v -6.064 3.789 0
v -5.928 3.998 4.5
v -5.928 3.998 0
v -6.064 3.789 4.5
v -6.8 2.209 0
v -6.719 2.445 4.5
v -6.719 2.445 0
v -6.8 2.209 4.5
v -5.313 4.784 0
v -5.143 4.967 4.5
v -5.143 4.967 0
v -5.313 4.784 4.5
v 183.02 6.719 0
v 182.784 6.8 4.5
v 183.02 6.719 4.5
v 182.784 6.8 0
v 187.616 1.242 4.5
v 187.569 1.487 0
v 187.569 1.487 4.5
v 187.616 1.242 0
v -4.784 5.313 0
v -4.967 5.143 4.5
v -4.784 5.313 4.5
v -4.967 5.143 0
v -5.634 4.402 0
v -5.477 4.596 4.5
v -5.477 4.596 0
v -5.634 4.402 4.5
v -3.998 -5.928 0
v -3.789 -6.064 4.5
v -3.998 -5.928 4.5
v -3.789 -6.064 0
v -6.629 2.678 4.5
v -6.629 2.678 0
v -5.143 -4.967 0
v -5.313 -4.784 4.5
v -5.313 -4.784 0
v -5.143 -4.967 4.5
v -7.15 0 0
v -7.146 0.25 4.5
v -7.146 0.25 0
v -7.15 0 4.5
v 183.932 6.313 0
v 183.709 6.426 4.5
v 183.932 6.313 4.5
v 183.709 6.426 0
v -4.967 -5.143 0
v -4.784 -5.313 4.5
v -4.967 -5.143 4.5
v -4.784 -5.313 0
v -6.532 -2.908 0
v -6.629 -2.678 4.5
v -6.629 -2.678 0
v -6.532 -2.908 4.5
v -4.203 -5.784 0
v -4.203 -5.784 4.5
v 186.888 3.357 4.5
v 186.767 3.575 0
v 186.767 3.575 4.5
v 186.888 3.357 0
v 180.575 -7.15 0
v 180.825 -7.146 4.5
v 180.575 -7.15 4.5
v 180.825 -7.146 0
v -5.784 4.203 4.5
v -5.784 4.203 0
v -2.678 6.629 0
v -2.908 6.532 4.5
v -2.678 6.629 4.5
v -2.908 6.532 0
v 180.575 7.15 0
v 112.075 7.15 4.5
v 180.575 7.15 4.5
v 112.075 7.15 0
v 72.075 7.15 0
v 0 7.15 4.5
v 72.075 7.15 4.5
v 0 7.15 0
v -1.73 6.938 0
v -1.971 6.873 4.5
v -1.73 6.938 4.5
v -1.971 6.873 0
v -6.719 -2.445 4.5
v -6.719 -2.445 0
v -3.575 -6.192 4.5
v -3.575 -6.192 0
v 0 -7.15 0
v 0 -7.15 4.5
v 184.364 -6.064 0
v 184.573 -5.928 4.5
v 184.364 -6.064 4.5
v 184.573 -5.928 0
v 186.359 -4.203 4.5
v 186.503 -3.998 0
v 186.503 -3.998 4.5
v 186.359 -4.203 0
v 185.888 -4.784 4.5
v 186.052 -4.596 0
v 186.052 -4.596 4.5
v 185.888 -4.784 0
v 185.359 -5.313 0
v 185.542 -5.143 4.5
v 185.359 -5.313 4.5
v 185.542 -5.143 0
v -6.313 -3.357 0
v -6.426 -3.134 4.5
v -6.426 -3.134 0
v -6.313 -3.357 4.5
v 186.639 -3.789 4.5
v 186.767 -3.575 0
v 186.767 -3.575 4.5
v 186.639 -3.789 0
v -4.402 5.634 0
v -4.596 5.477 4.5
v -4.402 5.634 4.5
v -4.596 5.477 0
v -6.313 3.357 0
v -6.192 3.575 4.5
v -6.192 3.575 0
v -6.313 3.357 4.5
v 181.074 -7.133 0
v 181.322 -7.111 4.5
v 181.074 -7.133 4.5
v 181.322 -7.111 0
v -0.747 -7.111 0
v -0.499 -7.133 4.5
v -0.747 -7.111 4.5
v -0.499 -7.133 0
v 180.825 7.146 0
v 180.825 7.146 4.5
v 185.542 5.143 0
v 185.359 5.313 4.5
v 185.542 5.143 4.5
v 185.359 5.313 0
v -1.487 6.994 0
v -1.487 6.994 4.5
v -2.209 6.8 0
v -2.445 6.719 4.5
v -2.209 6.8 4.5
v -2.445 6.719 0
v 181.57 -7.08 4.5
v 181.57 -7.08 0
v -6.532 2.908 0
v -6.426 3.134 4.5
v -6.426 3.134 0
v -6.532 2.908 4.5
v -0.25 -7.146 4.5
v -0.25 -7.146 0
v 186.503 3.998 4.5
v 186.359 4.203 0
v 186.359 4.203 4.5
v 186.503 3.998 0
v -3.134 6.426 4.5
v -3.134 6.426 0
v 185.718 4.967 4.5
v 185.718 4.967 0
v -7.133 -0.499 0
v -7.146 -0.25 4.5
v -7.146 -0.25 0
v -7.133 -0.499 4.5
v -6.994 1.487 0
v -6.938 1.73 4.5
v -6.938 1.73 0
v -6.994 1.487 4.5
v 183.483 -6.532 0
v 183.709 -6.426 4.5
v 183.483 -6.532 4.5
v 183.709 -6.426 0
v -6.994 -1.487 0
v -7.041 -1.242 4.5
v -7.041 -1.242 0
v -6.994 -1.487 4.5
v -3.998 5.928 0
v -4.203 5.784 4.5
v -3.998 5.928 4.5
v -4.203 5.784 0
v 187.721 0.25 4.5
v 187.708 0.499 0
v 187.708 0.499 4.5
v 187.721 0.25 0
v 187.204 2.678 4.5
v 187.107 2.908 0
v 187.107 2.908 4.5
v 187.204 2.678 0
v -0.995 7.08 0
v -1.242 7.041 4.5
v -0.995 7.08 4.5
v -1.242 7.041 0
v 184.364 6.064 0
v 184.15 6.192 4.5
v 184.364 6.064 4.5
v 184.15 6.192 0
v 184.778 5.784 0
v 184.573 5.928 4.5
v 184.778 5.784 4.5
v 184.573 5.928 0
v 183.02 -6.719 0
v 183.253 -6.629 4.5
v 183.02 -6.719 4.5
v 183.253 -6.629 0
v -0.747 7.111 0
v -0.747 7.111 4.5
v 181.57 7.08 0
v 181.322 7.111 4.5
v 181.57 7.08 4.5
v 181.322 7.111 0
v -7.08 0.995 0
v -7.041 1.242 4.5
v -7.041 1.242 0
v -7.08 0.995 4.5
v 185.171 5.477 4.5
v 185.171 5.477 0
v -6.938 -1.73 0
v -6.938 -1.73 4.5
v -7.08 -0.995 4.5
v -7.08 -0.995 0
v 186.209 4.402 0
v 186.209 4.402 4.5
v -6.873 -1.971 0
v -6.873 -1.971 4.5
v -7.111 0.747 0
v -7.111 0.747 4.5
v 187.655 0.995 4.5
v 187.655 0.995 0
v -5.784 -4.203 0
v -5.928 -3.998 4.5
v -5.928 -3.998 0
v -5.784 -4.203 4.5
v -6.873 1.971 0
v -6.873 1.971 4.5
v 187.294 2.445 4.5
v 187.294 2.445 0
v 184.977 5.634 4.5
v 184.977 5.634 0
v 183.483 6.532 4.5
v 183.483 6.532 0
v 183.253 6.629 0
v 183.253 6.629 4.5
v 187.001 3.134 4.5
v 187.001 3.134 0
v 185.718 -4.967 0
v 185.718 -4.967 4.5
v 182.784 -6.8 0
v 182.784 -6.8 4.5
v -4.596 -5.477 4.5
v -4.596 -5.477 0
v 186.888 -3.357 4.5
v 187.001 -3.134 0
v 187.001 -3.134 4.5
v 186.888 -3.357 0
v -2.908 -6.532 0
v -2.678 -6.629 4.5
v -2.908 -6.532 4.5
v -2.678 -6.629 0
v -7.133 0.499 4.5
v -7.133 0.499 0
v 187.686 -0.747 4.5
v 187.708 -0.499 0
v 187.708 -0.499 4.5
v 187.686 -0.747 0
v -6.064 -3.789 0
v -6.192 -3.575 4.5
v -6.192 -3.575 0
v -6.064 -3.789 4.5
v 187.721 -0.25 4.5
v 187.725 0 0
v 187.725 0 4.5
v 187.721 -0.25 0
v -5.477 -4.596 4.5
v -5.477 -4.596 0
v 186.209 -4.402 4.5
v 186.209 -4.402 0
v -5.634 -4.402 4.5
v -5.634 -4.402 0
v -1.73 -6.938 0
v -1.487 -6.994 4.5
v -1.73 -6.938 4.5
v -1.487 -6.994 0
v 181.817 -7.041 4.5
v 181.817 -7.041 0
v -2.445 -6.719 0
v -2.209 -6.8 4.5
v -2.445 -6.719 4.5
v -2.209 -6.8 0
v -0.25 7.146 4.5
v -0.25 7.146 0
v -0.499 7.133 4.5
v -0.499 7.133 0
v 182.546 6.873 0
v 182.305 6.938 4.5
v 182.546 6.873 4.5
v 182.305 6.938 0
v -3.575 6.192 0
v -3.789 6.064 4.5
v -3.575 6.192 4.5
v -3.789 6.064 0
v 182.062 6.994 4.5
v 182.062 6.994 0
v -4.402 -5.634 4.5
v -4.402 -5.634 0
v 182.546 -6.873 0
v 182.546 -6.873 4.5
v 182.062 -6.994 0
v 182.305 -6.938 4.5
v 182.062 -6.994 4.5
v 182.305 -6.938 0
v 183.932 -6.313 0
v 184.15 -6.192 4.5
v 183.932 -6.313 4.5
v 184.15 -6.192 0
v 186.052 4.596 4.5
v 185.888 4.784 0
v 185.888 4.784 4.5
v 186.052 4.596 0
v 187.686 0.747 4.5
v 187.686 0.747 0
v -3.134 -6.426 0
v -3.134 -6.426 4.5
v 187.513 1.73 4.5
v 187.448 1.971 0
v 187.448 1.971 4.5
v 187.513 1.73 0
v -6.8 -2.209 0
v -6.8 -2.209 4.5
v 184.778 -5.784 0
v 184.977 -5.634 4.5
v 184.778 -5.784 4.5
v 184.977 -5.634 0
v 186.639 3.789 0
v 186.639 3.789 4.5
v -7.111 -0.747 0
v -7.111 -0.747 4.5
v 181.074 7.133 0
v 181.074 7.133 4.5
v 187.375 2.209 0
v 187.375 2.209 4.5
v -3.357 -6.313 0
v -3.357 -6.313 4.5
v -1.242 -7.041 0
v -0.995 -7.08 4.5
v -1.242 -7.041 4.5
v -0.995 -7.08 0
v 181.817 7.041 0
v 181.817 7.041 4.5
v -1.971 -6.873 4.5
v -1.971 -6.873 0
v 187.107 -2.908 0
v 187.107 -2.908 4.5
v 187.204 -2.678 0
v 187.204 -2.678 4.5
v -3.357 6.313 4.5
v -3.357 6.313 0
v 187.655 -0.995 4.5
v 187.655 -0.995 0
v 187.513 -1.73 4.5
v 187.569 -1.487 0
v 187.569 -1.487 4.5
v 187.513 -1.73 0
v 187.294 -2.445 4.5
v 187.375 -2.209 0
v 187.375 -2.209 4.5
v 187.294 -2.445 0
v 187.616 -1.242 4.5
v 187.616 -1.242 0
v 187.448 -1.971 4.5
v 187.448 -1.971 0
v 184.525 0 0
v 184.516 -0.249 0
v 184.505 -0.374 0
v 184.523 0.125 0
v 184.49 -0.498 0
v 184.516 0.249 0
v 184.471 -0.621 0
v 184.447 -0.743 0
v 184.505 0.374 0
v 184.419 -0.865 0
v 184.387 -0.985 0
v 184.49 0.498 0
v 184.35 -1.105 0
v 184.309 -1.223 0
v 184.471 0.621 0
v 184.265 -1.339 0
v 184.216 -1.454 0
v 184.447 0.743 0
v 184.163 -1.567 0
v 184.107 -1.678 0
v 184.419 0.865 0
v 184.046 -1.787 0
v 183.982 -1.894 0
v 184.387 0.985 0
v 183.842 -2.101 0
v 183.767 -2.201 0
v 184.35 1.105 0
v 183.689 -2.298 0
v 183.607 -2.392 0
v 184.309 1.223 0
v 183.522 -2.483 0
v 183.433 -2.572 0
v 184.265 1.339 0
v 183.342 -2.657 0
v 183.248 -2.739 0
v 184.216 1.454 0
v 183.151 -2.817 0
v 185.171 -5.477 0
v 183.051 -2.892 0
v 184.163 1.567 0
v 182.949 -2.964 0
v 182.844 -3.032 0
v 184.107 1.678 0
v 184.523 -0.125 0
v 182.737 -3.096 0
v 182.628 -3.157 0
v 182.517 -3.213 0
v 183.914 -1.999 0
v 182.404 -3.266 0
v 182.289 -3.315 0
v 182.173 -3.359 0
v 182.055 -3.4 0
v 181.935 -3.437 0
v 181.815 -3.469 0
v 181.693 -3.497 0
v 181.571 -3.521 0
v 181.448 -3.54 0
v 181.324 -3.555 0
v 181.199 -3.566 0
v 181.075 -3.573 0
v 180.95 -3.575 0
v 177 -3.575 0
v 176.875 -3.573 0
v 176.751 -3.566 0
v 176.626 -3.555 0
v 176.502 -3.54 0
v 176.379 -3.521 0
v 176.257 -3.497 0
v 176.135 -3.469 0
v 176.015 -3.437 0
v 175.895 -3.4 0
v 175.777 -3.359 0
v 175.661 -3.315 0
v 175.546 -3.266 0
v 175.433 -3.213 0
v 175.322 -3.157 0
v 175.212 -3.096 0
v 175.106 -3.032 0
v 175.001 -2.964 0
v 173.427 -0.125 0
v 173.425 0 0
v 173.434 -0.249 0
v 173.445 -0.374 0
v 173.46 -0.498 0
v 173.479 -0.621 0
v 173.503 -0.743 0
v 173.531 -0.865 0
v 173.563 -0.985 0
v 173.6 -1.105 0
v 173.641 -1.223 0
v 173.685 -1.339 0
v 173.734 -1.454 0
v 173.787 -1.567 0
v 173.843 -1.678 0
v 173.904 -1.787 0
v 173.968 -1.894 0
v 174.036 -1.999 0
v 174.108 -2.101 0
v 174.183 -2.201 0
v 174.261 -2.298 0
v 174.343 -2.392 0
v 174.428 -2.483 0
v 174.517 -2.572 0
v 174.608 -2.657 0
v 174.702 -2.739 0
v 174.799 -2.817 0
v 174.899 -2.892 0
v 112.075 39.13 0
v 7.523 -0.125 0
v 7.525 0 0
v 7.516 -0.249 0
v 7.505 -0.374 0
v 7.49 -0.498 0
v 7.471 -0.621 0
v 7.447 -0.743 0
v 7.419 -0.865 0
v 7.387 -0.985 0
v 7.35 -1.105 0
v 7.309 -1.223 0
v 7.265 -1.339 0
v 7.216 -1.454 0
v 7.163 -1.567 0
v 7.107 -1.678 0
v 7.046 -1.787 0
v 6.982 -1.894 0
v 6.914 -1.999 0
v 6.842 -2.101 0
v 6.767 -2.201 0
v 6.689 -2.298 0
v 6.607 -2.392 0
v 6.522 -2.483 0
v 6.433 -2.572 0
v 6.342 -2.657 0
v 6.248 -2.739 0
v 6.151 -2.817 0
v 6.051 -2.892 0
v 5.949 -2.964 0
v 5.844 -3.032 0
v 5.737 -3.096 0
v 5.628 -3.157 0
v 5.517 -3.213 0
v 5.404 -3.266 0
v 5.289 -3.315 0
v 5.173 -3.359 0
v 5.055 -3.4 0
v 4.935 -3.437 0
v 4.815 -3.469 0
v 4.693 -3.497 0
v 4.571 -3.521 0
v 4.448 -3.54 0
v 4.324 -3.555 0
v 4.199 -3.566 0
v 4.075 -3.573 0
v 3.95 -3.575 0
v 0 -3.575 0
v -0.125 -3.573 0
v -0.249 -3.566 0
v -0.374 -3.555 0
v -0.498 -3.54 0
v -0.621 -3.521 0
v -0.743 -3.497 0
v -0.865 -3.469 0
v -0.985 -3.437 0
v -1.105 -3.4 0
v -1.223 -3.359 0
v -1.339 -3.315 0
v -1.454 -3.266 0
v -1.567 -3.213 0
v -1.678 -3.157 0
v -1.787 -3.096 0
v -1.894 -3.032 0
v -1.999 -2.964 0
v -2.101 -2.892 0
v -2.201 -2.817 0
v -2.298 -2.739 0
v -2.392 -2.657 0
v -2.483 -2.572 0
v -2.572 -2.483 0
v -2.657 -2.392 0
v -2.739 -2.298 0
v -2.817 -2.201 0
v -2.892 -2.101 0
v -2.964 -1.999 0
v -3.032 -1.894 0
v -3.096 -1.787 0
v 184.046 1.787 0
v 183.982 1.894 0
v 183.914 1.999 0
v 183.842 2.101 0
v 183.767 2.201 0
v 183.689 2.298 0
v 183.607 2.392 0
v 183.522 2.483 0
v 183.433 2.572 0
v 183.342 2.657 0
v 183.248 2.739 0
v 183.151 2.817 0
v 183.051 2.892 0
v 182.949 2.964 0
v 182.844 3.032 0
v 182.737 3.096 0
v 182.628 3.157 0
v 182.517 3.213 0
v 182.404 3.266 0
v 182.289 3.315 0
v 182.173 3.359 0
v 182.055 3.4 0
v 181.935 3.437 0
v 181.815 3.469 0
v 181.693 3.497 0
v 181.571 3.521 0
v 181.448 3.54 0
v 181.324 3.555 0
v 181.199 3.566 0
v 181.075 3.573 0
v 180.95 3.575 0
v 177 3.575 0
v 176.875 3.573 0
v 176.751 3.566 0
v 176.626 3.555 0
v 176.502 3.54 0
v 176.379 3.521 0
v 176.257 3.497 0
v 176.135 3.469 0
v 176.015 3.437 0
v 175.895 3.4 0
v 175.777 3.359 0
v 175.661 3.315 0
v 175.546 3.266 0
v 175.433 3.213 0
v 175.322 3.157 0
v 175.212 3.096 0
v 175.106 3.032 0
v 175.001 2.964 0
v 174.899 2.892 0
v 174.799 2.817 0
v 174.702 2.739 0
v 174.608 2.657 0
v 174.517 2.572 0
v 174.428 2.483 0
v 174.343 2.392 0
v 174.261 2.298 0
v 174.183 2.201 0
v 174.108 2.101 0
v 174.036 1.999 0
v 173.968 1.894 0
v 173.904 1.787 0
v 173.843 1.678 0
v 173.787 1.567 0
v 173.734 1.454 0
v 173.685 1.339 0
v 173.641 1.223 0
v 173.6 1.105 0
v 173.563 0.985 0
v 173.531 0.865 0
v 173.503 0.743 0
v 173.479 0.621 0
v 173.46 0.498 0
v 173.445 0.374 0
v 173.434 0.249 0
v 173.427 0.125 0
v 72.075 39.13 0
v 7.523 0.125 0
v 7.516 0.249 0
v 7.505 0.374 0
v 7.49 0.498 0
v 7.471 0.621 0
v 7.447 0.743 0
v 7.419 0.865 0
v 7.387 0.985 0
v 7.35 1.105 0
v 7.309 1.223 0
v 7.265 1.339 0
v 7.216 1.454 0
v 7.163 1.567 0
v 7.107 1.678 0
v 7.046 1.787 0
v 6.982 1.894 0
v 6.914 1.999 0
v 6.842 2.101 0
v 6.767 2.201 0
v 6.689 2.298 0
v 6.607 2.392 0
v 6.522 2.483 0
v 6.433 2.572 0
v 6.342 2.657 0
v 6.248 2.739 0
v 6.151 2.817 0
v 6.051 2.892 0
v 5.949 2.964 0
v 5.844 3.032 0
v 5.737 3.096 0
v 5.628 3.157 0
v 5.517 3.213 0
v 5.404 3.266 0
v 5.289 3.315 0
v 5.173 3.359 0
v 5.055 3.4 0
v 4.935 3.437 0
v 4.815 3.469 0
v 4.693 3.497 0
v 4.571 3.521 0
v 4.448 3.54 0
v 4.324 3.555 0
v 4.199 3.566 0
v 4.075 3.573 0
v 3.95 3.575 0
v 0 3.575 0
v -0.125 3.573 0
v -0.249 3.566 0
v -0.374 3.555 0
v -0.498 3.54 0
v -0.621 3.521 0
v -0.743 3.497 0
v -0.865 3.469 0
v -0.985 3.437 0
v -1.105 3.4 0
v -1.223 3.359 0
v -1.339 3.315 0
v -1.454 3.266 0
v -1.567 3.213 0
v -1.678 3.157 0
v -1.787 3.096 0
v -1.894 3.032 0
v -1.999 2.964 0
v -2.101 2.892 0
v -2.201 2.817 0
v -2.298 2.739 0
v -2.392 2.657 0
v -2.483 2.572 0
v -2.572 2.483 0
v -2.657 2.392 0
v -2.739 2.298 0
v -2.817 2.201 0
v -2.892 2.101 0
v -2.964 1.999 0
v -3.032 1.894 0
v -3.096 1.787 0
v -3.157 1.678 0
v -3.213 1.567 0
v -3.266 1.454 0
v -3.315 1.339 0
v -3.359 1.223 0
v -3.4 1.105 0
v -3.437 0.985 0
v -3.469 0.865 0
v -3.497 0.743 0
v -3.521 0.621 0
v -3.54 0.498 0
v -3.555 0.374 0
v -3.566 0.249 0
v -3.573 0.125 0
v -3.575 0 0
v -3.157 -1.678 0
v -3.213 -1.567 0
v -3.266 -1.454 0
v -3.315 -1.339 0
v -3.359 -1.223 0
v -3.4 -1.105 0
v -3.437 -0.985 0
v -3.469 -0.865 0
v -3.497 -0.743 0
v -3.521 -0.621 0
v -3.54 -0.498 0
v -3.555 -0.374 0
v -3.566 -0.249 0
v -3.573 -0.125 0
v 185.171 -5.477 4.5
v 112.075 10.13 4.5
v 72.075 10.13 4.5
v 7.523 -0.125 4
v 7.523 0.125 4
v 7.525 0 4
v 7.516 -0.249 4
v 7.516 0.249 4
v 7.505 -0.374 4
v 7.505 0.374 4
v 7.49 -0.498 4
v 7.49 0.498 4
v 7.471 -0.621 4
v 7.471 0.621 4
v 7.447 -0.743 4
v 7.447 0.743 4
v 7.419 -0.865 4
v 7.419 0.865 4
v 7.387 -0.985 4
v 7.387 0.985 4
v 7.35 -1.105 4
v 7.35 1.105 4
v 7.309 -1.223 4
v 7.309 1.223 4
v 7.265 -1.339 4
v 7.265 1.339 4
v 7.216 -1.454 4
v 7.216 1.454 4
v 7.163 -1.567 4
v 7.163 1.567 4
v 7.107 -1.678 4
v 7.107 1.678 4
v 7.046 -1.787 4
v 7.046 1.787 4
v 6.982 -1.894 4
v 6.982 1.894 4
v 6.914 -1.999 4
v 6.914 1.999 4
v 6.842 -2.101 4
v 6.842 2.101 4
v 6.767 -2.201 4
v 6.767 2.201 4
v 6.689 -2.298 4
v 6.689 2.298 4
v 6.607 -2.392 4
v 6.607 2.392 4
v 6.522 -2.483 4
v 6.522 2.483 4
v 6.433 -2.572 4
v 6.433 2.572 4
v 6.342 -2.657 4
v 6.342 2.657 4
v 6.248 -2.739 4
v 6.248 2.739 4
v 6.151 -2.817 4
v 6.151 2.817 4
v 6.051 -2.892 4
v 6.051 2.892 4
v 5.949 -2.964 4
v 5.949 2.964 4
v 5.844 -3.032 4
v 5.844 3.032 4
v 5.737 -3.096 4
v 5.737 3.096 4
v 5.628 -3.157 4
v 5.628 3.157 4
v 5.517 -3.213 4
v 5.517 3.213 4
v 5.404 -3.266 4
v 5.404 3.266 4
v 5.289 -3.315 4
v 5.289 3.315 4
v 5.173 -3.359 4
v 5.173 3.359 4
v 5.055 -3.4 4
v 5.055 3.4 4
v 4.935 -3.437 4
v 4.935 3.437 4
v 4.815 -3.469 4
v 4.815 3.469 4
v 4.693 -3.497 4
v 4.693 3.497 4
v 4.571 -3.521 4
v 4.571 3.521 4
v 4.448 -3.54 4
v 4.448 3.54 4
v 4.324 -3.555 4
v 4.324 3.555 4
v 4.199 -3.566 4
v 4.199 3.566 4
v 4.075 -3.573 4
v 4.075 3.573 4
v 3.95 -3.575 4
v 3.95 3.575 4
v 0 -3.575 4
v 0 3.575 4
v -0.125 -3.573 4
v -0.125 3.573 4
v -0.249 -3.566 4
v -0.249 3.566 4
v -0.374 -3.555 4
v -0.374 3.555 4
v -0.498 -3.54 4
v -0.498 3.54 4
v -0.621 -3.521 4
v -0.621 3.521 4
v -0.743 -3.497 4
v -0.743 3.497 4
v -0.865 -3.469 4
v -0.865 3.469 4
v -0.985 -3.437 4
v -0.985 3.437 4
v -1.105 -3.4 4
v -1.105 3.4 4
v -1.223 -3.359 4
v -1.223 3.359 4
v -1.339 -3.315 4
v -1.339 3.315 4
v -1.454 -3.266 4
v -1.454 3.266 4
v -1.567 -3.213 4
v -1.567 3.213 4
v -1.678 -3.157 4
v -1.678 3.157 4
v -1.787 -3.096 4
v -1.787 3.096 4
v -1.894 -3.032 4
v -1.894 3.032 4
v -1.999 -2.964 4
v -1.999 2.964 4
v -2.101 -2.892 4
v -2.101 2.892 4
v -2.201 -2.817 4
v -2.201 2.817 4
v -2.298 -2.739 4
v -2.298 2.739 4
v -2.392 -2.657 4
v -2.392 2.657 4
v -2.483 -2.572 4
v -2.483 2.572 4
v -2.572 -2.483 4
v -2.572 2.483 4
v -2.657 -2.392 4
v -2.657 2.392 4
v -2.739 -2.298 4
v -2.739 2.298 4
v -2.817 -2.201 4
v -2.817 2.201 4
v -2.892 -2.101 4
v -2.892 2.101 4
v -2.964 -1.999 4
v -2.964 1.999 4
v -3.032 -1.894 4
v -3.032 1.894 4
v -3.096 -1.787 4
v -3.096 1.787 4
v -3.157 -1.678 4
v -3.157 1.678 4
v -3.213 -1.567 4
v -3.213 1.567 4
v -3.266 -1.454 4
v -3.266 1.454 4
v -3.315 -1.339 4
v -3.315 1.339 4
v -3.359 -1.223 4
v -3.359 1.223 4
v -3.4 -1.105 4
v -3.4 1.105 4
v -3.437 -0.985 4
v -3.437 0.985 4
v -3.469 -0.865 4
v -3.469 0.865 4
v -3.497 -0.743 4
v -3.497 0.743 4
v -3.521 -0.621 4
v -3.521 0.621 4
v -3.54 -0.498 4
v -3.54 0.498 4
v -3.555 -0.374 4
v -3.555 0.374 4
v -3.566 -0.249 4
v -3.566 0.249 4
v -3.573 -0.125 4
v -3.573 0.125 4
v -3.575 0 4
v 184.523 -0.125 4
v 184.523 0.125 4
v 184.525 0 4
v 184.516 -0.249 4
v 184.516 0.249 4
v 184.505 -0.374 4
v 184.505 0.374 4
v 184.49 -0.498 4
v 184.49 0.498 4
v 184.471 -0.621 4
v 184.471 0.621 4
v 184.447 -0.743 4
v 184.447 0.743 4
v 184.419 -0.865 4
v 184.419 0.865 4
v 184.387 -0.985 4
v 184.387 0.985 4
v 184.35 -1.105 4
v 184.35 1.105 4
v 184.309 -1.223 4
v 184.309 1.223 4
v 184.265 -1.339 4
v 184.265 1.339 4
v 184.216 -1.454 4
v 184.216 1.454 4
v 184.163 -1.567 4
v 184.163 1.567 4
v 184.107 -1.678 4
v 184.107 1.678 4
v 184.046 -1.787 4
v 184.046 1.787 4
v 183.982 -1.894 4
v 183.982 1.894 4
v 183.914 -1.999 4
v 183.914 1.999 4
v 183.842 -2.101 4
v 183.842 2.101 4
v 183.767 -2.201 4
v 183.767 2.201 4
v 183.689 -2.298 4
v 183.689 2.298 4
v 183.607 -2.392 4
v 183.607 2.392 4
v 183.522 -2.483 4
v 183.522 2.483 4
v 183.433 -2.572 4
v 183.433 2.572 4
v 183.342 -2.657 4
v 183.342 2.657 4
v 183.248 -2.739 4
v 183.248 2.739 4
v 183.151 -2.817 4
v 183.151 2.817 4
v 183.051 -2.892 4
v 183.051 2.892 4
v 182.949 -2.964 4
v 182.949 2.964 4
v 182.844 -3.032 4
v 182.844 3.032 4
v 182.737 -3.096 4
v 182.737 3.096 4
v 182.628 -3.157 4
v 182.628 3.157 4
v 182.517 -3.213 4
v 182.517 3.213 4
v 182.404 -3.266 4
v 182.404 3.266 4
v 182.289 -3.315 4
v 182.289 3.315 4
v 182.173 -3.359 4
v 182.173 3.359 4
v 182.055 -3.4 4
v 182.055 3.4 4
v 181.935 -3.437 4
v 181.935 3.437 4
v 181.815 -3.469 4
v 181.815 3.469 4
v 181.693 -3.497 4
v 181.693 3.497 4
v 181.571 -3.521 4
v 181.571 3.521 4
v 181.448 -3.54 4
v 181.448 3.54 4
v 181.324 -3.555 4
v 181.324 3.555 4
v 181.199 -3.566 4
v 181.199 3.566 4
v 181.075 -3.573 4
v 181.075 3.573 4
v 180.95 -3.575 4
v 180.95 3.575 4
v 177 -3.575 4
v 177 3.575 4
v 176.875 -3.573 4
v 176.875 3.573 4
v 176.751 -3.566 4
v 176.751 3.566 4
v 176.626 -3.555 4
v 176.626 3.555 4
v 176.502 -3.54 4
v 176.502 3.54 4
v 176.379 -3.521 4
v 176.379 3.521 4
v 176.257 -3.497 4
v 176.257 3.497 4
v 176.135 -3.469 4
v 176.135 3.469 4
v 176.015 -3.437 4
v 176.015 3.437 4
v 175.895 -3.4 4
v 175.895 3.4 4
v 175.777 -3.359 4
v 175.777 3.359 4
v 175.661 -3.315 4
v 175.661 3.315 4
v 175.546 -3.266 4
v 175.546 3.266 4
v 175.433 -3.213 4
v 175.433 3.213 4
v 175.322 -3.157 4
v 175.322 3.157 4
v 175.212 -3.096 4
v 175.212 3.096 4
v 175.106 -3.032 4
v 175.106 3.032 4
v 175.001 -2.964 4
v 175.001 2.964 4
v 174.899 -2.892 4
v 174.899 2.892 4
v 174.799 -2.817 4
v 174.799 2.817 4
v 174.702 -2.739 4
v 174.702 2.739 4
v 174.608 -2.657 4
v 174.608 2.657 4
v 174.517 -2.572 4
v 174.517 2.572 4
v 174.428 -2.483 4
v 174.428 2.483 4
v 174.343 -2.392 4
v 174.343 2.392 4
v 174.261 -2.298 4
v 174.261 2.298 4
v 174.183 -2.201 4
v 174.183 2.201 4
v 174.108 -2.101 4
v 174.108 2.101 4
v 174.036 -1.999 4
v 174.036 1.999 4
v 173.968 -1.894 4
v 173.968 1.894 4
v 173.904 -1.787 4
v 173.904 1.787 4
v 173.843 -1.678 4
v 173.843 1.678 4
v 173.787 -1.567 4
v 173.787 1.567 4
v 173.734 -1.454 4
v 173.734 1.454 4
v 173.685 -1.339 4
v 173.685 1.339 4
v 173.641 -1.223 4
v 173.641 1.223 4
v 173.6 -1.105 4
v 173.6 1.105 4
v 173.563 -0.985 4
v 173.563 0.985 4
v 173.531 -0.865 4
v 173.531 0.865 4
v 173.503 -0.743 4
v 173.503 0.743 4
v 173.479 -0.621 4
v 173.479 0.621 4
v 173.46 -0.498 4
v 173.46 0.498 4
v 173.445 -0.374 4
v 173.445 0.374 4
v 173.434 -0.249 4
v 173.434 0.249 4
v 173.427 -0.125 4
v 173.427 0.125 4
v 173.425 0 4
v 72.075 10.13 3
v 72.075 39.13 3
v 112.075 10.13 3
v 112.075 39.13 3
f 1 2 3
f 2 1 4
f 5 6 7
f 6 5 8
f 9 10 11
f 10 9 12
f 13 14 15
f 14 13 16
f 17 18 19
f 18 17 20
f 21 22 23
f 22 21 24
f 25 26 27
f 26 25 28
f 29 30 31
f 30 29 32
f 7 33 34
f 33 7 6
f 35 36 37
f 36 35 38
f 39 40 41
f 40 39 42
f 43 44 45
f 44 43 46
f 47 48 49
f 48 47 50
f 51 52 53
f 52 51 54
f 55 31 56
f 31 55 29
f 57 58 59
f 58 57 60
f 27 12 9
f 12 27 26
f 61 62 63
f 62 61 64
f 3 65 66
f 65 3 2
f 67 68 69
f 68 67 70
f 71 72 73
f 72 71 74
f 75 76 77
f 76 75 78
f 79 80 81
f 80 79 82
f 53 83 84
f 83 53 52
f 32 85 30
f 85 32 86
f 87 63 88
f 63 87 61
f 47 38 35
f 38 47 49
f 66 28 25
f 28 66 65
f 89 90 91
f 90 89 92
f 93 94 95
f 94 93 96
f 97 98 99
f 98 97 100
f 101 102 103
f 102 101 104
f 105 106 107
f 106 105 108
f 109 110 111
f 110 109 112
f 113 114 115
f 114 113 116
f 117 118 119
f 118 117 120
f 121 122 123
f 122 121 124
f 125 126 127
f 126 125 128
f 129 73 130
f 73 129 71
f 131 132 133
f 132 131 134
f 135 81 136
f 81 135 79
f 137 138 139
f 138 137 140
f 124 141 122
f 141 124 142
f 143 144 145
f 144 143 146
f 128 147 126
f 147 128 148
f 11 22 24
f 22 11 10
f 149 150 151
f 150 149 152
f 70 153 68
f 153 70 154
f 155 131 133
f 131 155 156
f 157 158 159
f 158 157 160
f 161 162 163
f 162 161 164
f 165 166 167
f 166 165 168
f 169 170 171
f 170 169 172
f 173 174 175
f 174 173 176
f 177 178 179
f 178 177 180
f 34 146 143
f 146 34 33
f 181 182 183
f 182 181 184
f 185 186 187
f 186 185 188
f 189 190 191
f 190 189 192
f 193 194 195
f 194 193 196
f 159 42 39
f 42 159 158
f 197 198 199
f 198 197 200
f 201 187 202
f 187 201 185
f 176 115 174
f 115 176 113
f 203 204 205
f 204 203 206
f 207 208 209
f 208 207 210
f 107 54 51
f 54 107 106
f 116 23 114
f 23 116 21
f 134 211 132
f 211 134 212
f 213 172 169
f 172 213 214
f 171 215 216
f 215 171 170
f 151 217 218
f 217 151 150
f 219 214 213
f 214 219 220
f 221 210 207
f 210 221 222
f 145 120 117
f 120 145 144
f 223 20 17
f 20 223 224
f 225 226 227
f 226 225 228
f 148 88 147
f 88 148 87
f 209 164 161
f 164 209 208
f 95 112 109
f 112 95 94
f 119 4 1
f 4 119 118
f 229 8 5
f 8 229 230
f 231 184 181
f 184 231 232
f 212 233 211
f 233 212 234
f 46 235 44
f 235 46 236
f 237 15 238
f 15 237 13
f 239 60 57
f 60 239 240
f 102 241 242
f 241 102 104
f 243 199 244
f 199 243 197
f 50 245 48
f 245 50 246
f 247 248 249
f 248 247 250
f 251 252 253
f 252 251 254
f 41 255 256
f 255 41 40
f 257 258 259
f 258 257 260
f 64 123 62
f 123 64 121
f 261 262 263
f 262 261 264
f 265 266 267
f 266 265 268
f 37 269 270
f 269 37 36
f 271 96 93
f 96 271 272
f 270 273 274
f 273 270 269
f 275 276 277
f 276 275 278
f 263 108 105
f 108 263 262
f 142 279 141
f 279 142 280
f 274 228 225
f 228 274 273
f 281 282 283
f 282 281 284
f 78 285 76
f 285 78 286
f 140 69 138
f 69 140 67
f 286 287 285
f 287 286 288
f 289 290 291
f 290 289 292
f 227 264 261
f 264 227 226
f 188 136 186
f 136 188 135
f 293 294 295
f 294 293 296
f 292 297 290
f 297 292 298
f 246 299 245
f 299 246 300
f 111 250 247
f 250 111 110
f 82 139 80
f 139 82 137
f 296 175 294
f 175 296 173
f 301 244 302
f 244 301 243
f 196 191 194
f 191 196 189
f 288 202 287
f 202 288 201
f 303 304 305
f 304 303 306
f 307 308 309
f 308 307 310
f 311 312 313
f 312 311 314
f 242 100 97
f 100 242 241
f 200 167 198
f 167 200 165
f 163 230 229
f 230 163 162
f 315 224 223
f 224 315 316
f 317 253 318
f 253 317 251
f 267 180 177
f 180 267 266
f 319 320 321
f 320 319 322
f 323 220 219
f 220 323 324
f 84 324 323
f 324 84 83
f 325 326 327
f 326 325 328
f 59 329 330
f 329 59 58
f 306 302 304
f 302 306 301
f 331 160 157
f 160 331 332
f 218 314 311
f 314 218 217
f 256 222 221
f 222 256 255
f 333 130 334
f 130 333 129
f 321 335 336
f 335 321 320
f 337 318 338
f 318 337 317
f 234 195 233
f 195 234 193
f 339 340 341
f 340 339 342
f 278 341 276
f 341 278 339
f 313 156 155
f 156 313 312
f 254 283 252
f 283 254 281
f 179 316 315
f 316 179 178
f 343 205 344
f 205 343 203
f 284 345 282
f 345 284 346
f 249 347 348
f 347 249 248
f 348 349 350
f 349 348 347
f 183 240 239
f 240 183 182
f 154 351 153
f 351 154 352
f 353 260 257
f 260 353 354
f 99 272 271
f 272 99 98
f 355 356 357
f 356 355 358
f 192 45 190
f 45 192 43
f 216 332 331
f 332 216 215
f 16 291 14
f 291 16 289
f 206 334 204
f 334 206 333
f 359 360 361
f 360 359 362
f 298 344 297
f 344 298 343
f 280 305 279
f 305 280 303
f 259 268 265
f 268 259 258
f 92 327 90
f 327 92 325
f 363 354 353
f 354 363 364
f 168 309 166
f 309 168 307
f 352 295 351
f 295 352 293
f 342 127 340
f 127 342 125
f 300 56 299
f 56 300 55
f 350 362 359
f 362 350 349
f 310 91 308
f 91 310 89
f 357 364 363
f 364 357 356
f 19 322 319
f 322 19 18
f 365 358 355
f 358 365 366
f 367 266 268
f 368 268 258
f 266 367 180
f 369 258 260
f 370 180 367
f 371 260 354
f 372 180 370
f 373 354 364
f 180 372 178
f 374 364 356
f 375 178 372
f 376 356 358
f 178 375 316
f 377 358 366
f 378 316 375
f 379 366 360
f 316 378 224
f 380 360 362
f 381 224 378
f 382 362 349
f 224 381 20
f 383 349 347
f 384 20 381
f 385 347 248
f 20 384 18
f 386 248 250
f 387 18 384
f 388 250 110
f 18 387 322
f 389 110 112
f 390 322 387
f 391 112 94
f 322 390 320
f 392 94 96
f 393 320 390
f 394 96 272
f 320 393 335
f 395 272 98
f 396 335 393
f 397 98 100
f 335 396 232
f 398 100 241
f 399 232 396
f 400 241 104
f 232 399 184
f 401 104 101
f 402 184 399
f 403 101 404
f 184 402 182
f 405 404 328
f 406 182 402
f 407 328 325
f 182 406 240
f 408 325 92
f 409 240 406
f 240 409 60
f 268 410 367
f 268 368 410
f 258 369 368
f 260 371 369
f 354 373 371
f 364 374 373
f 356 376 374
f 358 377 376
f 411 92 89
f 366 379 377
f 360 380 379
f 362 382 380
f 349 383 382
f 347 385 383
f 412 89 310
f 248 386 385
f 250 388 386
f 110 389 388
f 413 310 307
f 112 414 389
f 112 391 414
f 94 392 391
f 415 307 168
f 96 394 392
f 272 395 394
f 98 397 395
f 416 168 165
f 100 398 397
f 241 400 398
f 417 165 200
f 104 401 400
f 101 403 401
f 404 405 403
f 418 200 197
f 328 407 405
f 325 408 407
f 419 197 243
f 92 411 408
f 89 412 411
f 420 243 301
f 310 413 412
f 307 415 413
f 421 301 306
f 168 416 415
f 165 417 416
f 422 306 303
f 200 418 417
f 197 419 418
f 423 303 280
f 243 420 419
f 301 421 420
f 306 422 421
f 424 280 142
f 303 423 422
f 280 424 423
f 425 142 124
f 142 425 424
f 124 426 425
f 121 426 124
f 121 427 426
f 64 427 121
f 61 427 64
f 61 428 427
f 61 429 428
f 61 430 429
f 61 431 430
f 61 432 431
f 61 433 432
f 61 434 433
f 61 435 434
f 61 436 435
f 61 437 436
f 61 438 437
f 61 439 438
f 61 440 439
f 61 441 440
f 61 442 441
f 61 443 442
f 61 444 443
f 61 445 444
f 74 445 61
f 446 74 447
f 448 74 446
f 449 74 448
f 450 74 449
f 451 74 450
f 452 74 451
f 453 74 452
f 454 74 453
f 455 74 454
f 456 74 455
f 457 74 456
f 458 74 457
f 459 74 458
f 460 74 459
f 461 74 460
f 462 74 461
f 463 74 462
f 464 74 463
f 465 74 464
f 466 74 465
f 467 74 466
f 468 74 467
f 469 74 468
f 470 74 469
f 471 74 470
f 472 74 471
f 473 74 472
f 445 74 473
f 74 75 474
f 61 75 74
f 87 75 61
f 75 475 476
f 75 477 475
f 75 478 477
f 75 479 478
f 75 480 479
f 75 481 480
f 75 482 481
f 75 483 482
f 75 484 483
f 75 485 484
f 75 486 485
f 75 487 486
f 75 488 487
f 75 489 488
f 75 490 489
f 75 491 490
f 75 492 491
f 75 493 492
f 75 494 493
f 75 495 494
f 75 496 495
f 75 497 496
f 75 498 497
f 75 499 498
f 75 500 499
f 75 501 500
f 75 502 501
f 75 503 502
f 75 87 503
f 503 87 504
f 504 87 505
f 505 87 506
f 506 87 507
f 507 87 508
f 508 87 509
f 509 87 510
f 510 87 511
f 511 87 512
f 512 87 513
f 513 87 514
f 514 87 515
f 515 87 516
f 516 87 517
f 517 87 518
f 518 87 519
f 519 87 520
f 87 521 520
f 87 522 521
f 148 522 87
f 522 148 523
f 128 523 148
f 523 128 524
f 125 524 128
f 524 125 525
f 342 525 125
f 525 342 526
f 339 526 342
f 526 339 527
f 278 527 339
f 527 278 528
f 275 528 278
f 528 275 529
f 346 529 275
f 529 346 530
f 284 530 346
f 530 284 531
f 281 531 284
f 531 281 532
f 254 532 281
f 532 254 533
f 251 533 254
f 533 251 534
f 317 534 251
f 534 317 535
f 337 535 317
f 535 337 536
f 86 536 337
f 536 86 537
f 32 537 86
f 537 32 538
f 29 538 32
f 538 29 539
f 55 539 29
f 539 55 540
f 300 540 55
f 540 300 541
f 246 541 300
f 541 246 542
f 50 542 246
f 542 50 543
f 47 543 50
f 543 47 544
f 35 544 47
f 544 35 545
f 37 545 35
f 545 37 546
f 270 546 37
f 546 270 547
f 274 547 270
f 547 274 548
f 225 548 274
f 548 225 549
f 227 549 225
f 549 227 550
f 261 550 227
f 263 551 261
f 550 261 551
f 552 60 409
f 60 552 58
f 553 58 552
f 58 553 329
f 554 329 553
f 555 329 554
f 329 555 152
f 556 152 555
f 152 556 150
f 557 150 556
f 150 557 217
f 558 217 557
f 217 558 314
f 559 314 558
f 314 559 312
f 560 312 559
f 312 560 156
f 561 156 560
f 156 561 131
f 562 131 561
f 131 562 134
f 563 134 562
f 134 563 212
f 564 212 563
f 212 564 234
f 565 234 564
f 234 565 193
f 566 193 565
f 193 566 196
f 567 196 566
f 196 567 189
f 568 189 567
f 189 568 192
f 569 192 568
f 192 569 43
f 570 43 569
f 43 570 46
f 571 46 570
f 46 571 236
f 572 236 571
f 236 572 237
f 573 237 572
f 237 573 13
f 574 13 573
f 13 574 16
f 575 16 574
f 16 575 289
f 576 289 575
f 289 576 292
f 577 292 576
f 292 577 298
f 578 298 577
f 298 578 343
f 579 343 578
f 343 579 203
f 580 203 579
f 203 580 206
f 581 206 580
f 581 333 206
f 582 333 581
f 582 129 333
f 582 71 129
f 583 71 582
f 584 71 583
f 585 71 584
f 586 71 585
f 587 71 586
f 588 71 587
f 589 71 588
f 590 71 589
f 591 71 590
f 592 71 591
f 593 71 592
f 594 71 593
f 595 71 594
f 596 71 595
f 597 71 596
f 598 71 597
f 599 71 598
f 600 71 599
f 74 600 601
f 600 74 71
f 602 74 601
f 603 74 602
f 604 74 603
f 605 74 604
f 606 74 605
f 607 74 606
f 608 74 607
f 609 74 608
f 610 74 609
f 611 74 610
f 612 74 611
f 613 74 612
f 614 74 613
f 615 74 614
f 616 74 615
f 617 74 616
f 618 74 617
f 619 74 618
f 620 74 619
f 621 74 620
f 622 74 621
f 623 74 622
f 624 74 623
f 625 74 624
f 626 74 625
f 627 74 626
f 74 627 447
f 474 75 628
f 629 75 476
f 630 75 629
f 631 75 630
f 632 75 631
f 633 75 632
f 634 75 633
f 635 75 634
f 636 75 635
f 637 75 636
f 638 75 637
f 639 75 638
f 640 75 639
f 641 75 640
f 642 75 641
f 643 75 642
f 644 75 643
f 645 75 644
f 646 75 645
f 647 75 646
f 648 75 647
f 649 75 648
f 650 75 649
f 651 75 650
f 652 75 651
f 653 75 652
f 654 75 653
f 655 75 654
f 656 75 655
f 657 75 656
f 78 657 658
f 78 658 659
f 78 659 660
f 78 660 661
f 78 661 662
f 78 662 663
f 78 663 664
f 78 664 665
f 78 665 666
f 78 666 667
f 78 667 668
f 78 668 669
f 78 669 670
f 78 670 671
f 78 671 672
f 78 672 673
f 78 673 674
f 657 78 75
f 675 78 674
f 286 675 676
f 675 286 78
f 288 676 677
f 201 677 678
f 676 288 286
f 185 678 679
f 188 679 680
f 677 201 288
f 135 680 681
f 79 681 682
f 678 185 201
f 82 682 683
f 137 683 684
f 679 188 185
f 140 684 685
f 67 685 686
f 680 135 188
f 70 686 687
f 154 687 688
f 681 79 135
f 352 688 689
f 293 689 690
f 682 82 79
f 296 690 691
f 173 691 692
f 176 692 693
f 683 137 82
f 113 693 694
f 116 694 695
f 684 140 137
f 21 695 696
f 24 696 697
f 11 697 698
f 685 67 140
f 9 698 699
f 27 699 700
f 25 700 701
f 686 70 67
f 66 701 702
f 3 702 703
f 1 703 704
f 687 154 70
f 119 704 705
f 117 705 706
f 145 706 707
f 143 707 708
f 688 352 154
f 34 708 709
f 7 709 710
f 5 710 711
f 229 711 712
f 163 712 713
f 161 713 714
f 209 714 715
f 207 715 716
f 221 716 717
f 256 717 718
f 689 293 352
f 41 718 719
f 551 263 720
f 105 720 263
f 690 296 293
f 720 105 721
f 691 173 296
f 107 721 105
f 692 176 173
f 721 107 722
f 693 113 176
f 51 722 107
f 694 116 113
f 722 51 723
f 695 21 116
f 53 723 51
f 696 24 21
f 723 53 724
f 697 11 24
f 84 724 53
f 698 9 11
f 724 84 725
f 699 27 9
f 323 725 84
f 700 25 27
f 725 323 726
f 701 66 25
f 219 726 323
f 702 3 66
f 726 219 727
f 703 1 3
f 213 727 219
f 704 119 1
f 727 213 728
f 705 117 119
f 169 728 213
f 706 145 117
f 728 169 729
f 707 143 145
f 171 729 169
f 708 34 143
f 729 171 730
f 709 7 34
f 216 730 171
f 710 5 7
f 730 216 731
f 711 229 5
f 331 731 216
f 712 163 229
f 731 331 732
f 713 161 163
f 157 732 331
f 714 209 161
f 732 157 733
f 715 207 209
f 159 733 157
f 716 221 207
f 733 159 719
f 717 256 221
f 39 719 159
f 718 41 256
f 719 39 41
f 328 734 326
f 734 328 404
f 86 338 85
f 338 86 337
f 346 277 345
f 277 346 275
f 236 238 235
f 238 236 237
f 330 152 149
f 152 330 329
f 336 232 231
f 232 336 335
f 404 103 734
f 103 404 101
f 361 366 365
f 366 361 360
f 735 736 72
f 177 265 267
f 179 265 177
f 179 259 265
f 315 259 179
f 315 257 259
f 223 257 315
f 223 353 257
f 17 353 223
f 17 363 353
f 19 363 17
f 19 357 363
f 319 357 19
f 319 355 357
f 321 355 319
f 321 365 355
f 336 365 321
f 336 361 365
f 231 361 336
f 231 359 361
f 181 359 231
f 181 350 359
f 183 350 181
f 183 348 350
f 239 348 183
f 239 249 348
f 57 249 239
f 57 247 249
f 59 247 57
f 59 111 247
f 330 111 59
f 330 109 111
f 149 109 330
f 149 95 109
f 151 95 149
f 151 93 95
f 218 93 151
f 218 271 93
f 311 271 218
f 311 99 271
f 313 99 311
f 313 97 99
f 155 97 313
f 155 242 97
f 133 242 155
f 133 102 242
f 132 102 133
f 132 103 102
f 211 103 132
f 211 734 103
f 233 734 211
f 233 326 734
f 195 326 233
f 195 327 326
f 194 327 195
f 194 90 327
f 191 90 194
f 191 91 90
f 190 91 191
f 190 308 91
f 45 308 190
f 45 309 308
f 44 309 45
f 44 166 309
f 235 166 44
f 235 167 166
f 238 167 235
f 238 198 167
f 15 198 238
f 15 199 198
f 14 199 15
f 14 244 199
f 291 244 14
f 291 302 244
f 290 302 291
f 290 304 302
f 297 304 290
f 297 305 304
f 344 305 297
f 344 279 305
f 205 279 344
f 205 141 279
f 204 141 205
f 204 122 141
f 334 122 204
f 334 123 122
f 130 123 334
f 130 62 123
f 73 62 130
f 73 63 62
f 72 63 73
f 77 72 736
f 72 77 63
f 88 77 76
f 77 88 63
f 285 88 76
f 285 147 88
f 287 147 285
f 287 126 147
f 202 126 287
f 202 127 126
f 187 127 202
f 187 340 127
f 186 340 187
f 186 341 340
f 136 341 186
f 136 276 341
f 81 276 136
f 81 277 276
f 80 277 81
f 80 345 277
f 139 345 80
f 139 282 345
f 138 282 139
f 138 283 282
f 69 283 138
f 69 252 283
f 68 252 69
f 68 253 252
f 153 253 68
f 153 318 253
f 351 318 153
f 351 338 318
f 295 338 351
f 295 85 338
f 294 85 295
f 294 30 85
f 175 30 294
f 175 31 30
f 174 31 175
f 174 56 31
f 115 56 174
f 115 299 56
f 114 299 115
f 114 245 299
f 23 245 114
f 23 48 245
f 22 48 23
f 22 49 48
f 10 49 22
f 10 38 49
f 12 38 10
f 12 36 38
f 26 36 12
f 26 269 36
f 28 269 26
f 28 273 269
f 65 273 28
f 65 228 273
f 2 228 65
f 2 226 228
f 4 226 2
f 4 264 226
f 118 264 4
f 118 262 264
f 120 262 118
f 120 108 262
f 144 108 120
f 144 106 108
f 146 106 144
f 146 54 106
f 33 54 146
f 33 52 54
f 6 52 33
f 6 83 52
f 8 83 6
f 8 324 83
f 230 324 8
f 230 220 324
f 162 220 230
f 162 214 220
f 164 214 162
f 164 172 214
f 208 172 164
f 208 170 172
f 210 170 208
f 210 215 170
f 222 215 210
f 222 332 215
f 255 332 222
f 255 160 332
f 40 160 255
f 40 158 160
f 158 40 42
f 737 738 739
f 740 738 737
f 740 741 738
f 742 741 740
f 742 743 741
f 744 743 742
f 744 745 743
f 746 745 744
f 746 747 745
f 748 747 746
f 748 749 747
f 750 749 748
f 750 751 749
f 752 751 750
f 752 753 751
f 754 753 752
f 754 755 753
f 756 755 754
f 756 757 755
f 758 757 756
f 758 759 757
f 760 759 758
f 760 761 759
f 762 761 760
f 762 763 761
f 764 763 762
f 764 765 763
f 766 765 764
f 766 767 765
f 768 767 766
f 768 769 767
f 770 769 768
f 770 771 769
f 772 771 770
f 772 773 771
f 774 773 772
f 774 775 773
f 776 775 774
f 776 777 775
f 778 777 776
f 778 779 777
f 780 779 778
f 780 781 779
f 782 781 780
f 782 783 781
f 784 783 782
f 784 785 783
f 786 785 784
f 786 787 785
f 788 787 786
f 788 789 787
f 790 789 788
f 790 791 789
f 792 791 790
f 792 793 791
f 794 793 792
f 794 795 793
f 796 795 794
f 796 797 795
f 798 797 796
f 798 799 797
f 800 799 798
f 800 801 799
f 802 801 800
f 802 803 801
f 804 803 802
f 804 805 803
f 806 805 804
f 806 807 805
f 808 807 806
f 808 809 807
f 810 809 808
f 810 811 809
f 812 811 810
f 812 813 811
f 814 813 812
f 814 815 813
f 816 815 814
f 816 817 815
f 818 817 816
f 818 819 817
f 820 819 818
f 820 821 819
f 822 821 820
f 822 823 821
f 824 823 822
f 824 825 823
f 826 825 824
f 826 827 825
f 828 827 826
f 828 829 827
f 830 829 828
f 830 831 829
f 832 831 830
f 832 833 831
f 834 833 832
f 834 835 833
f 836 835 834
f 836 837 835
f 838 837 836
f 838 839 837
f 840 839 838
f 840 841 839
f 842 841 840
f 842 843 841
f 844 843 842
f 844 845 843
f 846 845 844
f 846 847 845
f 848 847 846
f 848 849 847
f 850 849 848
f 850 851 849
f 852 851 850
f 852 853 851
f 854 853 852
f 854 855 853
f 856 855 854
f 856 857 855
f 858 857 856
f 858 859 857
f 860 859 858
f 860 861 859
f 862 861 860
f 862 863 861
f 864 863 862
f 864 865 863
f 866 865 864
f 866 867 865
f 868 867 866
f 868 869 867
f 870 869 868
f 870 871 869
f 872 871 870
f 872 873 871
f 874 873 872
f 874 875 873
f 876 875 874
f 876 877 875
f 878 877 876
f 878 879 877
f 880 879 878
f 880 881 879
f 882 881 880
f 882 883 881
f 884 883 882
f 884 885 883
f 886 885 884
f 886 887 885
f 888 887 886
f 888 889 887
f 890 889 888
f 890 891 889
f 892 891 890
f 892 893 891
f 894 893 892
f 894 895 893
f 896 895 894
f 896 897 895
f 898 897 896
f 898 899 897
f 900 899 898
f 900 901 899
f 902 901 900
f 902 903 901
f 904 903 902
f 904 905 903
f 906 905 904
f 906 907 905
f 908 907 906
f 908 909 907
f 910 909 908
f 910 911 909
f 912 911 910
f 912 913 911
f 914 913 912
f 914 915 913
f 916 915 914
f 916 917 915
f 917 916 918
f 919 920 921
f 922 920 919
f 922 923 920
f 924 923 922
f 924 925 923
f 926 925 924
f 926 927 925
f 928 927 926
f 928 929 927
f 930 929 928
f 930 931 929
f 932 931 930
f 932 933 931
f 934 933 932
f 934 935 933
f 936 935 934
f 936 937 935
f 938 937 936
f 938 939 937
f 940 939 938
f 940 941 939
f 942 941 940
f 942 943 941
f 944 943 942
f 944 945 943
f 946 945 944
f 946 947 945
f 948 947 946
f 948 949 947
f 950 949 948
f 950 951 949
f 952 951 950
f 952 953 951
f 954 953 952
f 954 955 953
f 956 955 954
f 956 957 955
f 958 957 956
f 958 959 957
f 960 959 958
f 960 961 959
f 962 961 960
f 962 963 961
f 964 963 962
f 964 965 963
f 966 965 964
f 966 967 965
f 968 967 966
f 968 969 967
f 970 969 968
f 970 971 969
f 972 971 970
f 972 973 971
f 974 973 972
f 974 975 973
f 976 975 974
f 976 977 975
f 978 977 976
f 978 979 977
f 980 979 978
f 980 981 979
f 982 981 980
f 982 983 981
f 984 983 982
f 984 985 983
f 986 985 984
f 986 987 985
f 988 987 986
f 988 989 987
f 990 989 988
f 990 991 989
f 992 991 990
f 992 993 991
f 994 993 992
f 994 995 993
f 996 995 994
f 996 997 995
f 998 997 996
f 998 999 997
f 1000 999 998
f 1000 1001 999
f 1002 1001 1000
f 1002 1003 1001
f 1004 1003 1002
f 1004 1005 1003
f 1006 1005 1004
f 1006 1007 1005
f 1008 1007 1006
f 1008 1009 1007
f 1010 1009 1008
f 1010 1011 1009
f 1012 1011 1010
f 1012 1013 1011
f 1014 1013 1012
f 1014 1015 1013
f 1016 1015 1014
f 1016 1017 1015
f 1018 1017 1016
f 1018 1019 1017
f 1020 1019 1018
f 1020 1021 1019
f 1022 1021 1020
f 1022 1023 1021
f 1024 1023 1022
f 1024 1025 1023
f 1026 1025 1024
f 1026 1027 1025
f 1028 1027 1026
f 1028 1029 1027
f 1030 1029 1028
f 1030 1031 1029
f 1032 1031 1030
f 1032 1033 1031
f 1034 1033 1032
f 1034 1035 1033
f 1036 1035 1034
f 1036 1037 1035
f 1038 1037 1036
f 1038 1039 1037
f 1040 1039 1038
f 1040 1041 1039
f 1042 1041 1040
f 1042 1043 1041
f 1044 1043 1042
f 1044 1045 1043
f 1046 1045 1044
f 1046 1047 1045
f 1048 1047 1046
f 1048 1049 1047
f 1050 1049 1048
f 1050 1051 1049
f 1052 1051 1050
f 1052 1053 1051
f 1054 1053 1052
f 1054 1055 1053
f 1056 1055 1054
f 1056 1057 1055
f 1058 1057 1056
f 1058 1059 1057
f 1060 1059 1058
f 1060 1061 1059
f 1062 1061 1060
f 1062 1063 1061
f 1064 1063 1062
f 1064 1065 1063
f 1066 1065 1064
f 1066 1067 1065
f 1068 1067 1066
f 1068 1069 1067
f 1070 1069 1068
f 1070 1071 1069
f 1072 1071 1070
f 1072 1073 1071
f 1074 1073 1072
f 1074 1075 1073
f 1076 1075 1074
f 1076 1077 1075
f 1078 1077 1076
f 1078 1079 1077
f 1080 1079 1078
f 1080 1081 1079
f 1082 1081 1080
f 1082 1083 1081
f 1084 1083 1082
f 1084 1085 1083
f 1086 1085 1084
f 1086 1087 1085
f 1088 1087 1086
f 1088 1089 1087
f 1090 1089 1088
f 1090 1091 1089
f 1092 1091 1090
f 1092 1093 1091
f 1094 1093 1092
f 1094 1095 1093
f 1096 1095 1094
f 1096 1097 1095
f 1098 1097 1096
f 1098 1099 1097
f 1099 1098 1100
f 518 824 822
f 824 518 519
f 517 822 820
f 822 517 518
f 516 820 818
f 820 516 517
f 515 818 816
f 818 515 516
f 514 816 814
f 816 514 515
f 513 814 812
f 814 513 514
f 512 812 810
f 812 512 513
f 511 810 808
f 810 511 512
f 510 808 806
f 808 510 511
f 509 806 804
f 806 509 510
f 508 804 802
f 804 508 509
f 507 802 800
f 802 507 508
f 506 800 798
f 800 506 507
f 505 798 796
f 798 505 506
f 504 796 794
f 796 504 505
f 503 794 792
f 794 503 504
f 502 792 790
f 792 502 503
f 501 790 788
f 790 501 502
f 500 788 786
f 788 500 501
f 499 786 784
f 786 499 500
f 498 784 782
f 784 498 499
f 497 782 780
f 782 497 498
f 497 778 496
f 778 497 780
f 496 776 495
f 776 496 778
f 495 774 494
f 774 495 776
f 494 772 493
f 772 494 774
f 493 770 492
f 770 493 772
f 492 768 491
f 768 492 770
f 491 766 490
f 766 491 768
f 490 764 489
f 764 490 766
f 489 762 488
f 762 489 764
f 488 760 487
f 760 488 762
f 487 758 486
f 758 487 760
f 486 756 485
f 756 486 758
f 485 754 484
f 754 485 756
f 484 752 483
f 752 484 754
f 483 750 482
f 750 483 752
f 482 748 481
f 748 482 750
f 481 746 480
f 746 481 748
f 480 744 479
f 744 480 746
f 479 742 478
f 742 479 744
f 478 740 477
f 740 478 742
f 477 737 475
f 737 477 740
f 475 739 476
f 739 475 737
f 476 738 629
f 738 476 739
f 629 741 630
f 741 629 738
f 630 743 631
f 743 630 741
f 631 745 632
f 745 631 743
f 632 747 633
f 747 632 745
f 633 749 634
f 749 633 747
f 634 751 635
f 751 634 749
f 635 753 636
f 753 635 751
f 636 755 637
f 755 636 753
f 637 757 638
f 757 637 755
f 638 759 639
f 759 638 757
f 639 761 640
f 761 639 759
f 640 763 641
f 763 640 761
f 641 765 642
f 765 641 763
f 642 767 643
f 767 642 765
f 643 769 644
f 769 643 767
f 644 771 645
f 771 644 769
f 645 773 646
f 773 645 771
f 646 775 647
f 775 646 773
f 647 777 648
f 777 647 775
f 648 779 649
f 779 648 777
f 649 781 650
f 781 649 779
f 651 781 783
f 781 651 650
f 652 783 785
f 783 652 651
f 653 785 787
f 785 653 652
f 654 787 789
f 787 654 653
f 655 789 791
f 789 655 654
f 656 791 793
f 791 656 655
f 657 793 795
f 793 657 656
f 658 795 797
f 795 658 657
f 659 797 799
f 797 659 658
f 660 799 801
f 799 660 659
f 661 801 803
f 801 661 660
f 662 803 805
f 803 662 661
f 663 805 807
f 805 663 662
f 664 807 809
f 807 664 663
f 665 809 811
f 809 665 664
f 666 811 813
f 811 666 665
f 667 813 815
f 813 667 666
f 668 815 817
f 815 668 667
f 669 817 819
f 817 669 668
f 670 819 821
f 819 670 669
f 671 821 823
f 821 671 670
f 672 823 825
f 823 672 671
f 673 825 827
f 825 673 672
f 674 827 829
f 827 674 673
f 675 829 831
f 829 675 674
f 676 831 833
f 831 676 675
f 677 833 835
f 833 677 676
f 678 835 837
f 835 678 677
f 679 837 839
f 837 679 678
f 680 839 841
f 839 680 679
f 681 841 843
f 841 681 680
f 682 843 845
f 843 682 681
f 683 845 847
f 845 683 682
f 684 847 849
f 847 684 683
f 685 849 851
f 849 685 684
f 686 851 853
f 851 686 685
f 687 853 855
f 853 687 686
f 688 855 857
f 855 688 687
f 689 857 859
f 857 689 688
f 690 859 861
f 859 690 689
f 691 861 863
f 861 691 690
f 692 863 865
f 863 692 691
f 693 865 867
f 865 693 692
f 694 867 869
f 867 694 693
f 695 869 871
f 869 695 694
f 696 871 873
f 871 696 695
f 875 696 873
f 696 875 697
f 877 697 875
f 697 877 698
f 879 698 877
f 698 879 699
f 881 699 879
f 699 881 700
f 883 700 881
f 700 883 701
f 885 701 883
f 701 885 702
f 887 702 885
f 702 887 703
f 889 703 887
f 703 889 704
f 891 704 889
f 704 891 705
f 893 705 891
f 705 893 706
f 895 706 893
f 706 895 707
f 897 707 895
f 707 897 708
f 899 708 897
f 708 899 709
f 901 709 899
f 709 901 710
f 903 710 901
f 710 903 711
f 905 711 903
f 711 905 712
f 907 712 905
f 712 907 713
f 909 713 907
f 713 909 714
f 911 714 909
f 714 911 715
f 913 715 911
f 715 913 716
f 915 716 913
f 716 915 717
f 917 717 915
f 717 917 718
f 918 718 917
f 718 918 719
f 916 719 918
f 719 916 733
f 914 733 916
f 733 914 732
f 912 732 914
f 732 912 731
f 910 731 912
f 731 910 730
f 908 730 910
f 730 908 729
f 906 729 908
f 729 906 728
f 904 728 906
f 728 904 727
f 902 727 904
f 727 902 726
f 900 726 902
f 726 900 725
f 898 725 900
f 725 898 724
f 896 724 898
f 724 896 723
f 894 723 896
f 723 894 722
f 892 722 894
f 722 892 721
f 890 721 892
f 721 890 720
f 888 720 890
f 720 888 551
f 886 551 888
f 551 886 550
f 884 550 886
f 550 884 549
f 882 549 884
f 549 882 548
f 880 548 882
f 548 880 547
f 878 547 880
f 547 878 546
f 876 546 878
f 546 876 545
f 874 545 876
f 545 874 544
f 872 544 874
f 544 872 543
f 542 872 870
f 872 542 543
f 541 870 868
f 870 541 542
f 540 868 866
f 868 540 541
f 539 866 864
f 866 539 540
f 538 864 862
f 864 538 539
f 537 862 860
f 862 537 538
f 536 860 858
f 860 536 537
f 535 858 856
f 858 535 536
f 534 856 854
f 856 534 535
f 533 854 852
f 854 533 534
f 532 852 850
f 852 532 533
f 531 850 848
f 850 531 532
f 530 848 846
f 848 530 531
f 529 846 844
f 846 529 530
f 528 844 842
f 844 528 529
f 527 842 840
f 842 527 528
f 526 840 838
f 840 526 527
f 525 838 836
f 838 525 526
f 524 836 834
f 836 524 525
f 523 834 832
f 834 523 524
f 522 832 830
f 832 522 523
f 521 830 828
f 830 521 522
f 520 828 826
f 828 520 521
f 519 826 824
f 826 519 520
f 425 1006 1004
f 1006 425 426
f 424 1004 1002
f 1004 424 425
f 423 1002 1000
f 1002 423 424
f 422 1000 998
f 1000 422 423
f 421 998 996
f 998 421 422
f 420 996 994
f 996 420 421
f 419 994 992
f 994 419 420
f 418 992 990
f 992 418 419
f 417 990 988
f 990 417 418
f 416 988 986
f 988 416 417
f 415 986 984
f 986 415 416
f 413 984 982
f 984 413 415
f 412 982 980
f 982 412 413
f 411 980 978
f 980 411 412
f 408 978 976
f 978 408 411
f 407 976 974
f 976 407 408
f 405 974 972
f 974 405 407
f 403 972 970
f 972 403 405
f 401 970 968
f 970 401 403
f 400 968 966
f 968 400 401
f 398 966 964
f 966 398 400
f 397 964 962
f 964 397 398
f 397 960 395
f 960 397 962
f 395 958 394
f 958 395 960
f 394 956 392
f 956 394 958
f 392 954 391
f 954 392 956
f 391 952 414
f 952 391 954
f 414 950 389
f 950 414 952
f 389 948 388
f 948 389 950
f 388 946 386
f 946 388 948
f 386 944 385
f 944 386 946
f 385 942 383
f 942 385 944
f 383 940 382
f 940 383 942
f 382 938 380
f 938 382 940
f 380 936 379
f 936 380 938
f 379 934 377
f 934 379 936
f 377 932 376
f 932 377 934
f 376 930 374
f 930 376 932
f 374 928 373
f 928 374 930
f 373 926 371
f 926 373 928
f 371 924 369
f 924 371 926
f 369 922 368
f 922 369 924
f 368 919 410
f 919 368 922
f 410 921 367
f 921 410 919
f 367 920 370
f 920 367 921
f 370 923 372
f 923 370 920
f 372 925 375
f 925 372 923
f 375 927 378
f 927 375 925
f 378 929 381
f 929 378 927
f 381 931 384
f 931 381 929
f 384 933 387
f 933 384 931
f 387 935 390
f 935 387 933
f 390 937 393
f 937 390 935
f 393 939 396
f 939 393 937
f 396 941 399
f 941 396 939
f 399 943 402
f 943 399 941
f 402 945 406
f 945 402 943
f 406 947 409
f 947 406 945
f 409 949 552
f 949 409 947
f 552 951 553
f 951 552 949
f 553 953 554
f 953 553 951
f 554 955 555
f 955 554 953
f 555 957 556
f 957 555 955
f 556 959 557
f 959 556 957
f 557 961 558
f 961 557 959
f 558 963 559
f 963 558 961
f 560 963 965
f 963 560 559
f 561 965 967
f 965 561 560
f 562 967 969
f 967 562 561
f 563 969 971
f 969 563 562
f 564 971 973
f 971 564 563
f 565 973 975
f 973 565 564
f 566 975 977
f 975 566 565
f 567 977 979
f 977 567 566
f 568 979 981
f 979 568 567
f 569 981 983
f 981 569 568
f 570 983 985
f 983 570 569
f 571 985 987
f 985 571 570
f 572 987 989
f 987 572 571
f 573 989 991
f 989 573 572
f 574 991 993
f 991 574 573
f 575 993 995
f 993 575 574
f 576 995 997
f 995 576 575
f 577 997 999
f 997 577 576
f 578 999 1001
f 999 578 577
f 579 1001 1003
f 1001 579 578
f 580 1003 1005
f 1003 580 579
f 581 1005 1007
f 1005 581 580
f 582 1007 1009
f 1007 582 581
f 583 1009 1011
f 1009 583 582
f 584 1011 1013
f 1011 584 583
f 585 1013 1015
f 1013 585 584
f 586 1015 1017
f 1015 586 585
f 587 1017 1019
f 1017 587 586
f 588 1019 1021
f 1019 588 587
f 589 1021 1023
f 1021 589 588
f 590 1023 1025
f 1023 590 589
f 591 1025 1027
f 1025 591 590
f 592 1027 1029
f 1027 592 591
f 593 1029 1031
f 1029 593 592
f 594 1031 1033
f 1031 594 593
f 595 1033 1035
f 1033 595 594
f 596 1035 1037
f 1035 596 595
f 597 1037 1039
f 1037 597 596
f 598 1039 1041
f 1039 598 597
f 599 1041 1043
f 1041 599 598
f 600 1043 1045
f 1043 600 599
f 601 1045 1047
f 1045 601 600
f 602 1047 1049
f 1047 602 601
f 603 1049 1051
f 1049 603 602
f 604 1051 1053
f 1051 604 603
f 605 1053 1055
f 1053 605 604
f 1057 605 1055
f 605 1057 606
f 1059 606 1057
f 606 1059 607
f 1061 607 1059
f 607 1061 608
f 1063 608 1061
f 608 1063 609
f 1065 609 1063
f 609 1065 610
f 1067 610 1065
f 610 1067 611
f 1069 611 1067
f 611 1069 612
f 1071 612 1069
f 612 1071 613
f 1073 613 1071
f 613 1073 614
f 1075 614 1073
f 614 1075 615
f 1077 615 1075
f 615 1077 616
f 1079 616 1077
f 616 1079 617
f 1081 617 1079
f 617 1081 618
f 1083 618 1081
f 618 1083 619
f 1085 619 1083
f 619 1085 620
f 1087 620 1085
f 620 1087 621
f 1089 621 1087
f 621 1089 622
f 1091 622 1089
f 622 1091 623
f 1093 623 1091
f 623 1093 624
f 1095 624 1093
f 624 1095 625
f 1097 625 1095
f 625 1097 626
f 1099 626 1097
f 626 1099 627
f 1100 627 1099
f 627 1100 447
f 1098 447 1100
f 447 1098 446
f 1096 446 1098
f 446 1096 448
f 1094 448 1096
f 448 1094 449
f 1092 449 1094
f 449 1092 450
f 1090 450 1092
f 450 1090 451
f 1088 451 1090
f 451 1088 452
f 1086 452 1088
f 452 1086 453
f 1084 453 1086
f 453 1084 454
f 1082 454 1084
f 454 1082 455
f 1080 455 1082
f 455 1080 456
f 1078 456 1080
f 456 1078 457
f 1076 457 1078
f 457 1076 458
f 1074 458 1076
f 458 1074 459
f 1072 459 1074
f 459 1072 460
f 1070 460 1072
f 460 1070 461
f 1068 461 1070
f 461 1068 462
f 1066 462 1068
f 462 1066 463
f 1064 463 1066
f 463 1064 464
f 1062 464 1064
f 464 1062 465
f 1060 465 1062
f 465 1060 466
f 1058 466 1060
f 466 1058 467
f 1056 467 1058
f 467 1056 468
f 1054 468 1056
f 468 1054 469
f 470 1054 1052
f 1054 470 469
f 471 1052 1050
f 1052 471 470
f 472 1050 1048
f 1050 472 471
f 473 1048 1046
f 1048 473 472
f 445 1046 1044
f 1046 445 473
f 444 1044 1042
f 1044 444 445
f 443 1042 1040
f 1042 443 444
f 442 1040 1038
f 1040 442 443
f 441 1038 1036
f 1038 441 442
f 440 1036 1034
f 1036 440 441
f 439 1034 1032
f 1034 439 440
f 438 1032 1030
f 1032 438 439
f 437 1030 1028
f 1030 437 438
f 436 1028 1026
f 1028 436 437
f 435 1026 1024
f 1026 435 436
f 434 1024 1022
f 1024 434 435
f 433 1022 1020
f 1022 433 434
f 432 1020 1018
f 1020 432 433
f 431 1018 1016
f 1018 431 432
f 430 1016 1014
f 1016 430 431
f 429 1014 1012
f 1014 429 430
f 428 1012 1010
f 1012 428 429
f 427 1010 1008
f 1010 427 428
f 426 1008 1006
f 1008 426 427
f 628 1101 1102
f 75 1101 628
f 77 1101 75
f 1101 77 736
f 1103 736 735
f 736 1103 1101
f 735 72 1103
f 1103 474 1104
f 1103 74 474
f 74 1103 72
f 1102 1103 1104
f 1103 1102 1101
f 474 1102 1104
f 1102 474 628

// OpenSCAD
// I have no idea what this was for. Update if found?

$fn=180;
hole_d=7.15;

module plate_hole() {
    hull() {
        circle(d=hole_d);
        translate([11.10-hole_d,0]) circle(d=hole_d);
    }
}

hole_dist=177;
module holes() {
    plate_hole();
    translate([hole_dist,0]) plate_hole();
}

difference() {
    hull() {
        cylinder(d=hole_d*2, h=4.5);
        translate([hole_dist+hole_d/2,0]) cylinder(d=hole_d*2, h=4.5);
    }
    translate([0,0,-1]) linear_extrude(5) holes();
}



module plate() {
    square([40,32]);
}




translate([(hole_d+hole_dist)/2-20,hole_d-0.02,0]) linear_extrude(4.5) square([40,3]);
translate([(hole_d+hole_dist)/2-20,hole_d-0.02,0]) linear_extrude(3) plate();
